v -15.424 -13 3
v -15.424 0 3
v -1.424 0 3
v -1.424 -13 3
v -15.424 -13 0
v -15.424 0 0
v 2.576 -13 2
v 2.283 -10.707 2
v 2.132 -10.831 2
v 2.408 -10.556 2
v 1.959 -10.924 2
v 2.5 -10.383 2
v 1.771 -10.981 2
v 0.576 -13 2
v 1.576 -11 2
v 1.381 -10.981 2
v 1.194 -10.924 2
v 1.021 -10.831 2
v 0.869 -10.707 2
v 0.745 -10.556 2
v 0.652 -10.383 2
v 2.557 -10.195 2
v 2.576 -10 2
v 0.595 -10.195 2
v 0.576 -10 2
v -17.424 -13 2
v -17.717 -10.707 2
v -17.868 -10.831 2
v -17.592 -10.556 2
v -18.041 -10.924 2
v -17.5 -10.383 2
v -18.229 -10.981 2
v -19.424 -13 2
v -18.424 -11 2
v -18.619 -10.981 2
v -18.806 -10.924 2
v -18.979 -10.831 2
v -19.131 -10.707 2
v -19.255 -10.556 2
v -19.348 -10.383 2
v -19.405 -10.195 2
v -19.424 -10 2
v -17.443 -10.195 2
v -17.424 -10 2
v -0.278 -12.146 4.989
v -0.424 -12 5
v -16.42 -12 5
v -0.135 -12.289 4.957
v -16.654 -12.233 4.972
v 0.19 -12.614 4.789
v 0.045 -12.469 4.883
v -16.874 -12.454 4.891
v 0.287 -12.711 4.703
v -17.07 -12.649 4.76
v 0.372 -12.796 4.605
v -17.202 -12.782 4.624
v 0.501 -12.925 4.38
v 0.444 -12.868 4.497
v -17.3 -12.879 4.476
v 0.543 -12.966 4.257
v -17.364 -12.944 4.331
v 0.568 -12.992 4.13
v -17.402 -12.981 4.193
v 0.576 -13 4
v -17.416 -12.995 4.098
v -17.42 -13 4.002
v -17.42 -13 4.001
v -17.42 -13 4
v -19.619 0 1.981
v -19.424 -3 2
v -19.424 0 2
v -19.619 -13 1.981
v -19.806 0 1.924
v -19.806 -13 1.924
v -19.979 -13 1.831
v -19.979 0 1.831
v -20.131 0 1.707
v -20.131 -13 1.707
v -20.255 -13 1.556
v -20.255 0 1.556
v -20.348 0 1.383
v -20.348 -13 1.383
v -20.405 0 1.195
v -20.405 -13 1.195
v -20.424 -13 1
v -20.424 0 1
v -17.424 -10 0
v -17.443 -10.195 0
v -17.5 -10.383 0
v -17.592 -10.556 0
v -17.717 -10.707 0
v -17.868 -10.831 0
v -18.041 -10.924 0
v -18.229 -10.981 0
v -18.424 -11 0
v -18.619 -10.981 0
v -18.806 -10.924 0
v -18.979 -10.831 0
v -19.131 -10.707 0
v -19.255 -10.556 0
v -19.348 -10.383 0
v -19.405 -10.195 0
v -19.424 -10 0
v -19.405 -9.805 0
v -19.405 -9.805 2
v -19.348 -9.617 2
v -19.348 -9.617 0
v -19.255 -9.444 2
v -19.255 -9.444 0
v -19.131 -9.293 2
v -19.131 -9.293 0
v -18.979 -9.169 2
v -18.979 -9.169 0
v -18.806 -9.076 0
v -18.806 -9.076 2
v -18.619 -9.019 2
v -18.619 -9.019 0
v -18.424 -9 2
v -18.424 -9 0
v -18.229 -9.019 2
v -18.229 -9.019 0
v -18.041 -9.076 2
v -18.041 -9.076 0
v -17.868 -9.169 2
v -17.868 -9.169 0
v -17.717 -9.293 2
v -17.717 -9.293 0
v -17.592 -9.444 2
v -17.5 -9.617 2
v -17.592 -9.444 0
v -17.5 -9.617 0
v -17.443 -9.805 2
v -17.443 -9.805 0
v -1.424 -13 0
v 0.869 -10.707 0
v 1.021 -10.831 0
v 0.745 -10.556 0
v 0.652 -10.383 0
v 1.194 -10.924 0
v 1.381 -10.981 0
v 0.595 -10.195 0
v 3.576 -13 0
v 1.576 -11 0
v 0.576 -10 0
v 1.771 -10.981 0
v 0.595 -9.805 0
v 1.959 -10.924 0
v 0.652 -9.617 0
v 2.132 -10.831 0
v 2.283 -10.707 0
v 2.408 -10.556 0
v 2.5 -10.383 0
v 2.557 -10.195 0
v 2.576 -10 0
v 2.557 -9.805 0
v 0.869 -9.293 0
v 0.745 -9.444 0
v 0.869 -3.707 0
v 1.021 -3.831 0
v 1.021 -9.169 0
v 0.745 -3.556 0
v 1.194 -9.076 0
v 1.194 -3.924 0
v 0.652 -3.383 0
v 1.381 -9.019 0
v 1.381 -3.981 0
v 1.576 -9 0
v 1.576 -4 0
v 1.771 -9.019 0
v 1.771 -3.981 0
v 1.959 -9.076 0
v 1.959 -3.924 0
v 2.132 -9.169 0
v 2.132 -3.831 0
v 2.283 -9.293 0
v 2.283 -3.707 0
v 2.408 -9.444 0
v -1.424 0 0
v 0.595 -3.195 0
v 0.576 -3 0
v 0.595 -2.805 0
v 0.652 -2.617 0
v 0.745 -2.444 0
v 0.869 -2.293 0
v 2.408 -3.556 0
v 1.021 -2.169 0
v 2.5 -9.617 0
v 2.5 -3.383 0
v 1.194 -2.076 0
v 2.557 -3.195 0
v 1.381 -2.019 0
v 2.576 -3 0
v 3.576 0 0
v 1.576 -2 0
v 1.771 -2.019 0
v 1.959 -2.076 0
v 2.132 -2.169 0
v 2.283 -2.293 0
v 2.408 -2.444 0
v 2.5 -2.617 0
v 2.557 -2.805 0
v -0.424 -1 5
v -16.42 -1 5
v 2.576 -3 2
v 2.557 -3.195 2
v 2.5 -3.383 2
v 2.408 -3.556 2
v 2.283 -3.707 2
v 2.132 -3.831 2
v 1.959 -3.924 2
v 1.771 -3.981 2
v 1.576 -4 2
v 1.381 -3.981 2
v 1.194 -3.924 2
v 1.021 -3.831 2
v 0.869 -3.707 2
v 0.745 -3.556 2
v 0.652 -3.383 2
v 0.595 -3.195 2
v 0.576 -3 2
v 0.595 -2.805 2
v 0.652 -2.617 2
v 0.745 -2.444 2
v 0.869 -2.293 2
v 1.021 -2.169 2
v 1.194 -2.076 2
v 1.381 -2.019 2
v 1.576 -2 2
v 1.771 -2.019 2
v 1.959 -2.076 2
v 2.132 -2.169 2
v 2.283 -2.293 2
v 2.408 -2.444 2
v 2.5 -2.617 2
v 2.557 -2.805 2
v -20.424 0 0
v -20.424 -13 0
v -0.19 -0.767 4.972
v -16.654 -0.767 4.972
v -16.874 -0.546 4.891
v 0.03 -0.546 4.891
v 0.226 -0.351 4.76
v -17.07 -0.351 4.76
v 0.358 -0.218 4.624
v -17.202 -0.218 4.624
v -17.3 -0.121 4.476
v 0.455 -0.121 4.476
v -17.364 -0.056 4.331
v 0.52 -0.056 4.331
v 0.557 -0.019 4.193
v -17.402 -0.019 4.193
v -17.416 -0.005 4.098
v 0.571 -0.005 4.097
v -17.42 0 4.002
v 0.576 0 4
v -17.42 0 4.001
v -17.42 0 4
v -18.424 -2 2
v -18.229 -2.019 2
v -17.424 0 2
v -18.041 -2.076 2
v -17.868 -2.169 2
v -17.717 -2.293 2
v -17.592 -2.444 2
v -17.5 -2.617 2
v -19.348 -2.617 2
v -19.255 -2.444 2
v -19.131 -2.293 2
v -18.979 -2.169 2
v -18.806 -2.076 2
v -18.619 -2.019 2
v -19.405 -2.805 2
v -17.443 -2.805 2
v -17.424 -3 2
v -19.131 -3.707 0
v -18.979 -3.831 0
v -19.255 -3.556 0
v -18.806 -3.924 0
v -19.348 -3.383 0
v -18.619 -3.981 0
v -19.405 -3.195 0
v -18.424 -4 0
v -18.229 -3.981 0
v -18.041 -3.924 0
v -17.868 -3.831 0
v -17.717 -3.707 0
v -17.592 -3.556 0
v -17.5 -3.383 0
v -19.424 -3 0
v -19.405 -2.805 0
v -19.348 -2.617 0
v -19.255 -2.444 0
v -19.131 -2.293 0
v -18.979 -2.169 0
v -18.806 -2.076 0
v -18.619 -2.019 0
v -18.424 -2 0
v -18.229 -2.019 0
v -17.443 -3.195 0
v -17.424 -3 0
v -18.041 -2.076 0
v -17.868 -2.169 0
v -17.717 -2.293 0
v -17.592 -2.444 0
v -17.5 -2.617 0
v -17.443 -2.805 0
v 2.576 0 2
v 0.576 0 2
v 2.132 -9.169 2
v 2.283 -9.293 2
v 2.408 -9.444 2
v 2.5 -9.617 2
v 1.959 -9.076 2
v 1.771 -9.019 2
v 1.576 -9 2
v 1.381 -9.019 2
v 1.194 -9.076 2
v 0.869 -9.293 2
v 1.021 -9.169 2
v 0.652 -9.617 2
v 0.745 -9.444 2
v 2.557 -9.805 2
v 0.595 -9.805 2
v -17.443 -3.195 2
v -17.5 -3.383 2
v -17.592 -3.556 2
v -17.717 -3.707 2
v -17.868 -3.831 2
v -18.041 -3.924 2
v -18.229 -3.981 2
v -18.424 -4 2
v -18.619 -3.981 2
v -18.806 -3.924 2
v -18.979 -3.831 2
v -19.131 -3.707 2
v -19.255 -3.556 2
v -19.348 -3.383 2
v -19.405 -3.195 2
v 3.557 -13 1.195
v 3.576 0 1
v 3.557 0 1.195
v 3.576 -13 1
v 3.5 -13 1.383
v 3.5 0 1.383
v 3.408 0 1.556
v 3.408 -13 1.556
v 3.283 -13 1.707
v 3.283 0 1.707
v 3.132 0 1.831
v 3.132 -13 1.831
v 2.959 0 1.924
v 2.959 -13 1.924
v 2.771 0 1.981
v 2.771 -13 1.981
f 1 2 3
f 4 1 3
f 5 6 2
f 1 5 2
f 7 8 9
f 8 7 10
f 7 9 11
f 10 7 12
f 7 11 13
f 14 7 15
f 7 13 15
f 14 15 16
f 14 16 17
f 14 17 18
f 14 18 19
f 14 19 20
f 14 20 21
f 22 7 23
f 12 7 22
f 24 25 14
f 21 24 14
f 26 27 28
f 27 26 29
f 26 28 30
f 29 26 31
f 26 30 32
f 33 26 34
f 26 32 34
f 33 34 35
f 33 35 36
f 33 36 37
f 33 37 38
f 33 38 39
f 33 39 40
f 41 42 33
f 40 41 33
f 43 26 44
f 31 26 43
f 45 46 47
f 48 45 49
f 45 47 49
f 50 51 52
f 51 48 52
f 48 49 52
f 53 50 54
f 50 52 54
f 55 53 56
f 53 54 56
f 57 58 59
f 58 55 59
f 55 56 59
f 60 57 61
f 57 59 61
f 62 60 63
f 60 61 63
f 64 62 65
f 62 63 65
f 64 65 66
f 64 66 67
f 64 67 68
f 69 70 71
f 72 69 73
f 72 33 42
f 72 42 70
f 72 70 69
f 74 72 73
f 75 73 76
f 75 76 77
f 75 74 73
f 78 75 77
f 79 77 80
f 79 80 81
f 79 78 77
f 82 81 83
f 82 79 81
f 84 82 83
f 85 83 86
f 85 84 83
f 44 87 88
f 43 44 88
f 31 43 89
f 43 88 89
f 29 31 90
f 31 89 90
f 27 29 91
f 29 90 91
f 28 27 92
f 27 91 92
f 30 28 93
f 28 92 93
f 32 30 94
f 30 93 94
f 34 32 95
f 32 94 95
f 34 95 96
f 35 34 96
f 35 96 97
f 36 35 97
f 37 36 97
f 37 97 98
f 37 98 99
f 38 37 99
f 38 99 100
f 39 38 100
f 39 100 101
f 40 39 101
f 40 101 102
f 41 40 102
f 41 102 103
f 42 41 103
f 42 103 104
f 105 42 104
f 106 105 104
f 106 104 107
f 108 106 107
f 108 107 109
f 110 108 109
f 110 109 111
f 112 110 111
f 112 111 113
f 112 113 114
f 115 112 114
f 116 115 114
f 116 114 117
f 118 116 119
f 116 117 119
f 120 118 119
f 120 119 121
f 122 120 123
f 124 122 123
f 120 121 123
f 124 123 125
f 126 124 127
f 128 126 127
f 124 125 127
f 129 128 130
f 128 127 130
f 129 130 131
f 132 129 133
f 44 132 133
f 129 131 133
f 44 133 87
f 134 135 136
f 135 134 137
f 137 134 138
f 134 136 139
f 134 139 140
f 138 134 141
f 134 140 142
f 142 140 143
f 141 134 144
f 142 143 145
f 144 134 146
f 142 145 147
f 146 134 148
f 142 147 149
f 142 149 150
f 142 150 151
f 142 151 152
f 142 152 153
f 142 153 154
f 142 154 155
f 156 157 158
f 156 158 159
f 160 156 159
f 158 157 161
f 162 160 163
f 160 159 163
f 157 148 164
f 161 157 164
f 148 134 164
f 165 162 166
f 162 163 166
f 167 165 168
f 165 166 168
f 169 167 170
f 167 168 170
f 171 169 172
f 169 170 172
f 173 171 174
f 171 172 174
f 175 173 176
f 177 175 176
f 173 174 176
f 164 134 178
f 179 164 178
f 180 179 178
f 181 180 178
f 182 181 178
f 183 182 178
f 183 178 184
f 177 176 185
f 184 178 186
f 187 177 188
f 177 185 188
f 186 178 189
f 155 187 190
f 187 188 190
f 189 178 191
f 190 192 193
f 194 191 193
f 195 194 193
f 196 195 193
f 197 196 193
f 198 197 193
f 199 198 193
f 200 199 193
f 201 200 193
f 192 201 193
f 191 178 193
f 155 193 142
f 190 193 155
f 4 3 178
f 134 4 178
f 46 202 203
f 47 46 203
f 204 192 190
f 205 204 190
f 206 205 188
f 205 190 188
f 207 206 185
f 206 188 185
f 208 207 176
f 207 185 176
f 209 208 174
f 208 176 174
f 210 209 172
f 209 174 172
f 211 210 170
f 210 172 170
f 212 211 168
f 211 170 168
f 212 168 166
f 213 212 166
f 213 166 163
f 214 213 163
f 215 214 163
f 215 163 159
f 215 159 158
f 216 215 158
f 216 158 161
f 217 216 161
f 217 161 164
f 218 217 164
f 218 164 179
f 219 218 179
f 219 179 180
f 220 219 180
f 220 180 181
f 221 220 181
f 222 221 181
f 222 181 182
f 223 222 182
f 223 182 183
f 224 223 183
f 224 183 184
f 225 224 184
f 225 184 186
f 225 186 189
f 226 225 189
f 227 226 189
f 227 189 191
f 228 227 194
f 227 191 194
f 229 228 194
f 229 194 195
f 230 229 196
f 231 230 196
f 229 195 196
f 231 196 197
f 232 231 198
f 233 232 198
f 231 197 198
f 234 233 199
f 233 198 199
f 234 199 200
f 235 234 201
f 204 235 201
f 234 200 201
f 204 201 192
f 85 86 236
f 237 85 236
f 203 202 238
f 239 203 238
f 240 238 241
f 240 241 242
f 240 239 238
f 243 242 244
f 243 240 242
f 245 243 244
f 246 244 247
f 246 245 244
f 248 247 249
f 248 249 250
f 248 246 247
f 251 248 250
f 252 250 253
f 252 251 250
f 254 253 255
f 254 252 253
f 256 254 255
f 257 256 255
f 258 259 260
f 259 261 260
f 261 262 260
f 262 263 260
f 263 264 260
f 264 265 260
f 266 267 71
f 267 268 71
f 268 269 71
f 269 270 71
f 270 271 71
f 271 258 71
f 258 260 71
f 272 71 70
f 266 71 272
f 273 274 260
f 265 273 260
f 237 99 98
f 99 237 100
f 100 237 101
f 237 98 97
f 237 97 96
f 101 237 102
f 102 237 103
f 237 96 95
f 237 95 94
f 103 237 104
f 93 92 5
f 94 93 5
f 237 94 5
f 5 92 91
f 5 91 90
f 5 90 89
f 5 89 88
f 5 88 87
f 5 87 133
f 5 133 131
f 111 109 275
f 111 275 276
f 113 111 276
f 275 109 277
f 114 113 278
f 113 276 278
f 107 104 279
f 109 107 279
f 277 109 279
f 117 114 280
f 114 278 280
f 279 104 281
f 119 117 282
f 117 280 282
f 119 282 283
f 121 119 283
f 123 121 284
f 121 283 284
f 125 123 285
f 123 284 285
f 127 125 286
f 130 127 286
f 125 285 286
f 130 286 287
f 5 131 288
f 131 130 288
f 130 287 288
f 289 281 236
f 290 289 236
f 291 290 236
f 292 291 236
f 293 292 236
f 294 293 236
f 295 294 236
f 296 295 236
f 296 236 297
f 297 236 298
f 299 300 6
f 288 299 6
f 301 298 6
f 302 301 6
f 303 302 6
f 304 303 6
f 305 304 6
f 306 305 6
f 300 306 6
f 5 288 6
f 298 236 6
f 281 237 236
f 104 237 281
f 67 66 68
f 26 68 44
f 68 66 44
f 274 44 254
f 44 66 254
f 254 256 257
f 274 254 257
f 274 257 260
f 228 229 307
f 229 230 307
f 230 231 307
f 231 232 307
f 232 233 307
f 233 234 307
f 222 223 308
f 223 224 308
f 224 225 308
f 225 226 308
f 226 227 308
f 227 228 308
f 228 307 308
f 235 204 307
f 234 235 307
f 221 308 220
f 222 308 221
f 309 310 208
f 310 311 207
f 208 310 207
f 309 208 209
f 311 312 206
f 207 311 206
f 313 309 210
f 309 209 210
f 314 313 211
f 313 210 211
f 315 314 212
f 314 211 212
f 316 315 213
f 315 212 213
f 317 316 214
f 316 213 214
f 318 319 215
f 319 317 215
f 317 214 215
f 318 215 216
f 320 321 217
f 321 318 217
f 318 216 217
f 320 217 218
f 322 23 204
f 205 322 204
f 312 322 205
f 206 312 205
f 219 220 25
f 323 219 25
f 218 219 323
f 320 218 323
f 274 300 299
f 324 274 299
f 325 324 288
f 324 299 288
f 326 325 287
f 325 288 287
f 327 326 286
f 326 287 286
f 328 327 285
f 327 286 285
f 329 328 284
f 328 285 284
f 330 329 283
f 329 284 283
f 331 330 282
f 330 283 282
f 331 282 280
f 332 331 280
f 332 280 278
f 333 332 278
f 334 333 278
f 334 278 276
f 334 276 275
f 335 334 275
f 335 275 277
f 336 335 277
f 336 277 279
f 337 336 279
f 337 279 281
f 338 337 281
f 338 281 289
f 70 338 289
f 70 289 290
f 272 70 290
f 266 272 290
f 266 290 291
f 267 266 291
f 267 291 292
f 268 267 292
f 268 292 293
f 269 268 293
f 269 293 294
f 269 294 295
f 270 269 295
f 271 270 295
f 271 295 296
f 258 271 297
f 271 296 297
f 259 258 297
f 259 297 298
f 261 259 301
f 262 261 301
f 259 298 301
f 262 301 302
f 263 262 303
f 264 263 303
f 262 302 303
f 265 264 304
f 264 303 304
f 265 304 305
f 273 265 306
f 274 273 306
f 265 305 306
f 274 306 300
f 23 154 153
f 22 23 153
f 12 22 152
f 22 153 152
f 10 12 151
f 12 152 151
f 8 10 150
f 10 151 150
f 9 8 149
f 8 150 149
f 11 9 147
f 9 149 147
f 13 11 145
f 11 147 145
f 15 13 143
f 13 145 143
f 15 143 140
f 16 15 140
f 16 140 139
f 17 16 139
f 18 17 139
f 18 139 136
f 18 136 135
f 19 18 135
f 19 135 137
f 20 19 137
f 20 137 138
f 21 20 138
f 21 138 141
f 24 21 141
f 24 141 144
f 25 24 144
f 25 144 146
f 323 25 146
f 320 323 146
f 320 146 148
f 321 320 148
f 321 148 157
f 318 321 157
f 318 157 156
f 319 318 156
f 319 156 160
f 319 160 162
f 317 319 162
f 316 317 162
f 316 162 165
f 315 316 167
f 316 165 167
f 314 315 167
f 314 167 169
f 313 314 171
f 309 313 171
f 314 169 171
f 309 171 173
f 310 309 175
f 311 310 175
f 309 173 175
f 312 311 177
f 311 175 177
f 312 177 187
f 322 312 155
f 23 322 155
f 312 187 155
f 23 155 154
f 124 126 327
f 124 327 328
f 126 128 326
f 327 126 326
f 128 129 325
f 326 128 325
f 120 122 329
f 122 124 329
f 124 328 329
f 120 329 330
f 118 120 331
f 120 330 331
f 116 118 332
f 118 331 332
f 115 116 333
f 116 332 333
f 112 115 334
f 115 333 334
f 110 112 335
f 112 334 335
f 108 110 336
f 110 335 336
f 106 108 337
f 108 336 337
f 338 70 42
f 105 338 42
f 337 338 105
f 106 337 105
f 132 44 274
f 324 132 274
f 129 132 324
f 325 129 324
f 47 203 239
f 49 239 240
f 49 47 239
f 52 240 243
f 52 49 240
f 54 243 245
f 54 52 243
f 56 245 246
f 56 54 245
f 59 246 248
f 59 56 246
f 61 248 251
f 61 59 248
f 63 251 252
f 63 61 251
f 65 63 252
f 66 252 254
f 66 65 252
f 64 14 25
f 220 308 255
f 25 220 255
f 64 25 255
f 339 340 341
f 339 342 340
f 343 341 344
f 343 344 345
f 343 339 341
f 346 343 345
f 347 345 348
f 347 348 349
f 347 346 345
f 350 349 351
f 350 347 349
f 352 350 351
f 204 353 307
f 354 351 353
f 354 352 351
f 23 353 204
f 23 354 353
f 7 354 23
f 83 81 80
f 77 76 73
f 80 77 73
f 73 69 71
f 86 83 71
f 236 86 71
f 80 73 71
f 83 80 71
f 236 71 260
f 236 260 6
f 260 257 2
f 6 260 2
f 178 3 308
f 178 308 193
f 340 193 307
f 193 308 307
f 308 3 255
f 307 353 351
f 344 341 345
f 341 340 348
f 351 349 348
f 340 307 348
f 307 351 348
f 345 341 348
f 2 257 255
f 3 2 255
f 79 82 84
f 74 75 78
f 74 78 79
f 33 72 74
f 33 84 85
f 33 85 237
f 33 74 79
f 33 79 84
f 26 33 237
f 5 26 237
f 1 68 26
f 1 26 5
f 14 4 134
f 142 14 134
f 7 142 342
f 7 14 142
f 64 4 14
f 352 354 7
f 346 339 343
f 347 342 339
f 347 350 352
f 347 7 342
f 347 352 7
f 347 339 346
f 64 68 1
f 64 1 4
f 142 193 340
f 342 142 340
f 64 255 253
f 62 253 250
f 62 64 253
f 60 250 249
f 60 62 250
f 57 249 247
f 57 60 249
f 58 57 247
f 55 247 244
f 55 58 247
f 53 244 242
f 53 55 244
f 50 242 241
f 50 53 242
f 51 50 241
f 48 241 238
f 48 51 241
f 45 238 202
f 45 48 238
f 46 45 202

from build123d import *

# Parameters (mm, degrees)
F1_DEPTH = 13
F2_R     = 1
F3_R     = 1
F4_DEPTH = 25
F5_R     = 1
F6_DEPTH = 25


with BuildPart() as f1:
    # F0 (on Front) → F1 (new body)
    with BuildSketch(Plane.XZ):
        Polygon((-20.4238126724, 0), (-18.61380395, 0), (-15.4238126724, 0), (-15.4238126724, 3), (-1.4238126724, 3), (-1.4238126724, 0), (3.5761873276, 0), (3.5761873276, 2), (0.5761873276, 2), (0.5761873276, 5), (-17.4186695367, 5), (-17.4238126724, 2), (-20.4238126724, 2), align=None)
    extrude(amount=F1_DEPTH)

    # F2
    f2_edges = [f1.edges().sort_by_distance(p)[0] for p in [
        (-8.421241, 0, 5),
        (0.576187, -6.5, 5),
        (-17.41867, -6.5, 5),
        (-8.421241, -13, 5),
        (3.576187, -6.5, 2),
        (-20.423813, -6.5, 2),
    ]]
    fillet(f2_edges, radius=F2_R)

    # F3 (on face) → F4 (cut)
    with BuildSketch(Plane(origin=(0, 0, 0), x_dir=(1, 0, 0), z_dir=(0, 0, -1))):
        with Locations((-18.4238126724, 10)):
            Circle(F3_R)
        with Locations((-18.4238126724, 3)):
            Circle(F3_R)
    extrude(amount=-F4_DEPTH, mode=Mode.SUBTRACT)

    # F5 (on face) → F6 (cut)
    with BuildSketch(Plane(origin=(0, 0, 0), x_dir=(1, 0, 0), z_dir=(0, 0, -1))):
        with Locations((1.5761873276, 10)):
            Circle(F5_R)
        with Locations((1.5761873276, 3)):
            Circle(F5_R)
    extrude(amount=-F6_DEPTH, mode=Mode.SUBTRACT)


solid = f1.part
